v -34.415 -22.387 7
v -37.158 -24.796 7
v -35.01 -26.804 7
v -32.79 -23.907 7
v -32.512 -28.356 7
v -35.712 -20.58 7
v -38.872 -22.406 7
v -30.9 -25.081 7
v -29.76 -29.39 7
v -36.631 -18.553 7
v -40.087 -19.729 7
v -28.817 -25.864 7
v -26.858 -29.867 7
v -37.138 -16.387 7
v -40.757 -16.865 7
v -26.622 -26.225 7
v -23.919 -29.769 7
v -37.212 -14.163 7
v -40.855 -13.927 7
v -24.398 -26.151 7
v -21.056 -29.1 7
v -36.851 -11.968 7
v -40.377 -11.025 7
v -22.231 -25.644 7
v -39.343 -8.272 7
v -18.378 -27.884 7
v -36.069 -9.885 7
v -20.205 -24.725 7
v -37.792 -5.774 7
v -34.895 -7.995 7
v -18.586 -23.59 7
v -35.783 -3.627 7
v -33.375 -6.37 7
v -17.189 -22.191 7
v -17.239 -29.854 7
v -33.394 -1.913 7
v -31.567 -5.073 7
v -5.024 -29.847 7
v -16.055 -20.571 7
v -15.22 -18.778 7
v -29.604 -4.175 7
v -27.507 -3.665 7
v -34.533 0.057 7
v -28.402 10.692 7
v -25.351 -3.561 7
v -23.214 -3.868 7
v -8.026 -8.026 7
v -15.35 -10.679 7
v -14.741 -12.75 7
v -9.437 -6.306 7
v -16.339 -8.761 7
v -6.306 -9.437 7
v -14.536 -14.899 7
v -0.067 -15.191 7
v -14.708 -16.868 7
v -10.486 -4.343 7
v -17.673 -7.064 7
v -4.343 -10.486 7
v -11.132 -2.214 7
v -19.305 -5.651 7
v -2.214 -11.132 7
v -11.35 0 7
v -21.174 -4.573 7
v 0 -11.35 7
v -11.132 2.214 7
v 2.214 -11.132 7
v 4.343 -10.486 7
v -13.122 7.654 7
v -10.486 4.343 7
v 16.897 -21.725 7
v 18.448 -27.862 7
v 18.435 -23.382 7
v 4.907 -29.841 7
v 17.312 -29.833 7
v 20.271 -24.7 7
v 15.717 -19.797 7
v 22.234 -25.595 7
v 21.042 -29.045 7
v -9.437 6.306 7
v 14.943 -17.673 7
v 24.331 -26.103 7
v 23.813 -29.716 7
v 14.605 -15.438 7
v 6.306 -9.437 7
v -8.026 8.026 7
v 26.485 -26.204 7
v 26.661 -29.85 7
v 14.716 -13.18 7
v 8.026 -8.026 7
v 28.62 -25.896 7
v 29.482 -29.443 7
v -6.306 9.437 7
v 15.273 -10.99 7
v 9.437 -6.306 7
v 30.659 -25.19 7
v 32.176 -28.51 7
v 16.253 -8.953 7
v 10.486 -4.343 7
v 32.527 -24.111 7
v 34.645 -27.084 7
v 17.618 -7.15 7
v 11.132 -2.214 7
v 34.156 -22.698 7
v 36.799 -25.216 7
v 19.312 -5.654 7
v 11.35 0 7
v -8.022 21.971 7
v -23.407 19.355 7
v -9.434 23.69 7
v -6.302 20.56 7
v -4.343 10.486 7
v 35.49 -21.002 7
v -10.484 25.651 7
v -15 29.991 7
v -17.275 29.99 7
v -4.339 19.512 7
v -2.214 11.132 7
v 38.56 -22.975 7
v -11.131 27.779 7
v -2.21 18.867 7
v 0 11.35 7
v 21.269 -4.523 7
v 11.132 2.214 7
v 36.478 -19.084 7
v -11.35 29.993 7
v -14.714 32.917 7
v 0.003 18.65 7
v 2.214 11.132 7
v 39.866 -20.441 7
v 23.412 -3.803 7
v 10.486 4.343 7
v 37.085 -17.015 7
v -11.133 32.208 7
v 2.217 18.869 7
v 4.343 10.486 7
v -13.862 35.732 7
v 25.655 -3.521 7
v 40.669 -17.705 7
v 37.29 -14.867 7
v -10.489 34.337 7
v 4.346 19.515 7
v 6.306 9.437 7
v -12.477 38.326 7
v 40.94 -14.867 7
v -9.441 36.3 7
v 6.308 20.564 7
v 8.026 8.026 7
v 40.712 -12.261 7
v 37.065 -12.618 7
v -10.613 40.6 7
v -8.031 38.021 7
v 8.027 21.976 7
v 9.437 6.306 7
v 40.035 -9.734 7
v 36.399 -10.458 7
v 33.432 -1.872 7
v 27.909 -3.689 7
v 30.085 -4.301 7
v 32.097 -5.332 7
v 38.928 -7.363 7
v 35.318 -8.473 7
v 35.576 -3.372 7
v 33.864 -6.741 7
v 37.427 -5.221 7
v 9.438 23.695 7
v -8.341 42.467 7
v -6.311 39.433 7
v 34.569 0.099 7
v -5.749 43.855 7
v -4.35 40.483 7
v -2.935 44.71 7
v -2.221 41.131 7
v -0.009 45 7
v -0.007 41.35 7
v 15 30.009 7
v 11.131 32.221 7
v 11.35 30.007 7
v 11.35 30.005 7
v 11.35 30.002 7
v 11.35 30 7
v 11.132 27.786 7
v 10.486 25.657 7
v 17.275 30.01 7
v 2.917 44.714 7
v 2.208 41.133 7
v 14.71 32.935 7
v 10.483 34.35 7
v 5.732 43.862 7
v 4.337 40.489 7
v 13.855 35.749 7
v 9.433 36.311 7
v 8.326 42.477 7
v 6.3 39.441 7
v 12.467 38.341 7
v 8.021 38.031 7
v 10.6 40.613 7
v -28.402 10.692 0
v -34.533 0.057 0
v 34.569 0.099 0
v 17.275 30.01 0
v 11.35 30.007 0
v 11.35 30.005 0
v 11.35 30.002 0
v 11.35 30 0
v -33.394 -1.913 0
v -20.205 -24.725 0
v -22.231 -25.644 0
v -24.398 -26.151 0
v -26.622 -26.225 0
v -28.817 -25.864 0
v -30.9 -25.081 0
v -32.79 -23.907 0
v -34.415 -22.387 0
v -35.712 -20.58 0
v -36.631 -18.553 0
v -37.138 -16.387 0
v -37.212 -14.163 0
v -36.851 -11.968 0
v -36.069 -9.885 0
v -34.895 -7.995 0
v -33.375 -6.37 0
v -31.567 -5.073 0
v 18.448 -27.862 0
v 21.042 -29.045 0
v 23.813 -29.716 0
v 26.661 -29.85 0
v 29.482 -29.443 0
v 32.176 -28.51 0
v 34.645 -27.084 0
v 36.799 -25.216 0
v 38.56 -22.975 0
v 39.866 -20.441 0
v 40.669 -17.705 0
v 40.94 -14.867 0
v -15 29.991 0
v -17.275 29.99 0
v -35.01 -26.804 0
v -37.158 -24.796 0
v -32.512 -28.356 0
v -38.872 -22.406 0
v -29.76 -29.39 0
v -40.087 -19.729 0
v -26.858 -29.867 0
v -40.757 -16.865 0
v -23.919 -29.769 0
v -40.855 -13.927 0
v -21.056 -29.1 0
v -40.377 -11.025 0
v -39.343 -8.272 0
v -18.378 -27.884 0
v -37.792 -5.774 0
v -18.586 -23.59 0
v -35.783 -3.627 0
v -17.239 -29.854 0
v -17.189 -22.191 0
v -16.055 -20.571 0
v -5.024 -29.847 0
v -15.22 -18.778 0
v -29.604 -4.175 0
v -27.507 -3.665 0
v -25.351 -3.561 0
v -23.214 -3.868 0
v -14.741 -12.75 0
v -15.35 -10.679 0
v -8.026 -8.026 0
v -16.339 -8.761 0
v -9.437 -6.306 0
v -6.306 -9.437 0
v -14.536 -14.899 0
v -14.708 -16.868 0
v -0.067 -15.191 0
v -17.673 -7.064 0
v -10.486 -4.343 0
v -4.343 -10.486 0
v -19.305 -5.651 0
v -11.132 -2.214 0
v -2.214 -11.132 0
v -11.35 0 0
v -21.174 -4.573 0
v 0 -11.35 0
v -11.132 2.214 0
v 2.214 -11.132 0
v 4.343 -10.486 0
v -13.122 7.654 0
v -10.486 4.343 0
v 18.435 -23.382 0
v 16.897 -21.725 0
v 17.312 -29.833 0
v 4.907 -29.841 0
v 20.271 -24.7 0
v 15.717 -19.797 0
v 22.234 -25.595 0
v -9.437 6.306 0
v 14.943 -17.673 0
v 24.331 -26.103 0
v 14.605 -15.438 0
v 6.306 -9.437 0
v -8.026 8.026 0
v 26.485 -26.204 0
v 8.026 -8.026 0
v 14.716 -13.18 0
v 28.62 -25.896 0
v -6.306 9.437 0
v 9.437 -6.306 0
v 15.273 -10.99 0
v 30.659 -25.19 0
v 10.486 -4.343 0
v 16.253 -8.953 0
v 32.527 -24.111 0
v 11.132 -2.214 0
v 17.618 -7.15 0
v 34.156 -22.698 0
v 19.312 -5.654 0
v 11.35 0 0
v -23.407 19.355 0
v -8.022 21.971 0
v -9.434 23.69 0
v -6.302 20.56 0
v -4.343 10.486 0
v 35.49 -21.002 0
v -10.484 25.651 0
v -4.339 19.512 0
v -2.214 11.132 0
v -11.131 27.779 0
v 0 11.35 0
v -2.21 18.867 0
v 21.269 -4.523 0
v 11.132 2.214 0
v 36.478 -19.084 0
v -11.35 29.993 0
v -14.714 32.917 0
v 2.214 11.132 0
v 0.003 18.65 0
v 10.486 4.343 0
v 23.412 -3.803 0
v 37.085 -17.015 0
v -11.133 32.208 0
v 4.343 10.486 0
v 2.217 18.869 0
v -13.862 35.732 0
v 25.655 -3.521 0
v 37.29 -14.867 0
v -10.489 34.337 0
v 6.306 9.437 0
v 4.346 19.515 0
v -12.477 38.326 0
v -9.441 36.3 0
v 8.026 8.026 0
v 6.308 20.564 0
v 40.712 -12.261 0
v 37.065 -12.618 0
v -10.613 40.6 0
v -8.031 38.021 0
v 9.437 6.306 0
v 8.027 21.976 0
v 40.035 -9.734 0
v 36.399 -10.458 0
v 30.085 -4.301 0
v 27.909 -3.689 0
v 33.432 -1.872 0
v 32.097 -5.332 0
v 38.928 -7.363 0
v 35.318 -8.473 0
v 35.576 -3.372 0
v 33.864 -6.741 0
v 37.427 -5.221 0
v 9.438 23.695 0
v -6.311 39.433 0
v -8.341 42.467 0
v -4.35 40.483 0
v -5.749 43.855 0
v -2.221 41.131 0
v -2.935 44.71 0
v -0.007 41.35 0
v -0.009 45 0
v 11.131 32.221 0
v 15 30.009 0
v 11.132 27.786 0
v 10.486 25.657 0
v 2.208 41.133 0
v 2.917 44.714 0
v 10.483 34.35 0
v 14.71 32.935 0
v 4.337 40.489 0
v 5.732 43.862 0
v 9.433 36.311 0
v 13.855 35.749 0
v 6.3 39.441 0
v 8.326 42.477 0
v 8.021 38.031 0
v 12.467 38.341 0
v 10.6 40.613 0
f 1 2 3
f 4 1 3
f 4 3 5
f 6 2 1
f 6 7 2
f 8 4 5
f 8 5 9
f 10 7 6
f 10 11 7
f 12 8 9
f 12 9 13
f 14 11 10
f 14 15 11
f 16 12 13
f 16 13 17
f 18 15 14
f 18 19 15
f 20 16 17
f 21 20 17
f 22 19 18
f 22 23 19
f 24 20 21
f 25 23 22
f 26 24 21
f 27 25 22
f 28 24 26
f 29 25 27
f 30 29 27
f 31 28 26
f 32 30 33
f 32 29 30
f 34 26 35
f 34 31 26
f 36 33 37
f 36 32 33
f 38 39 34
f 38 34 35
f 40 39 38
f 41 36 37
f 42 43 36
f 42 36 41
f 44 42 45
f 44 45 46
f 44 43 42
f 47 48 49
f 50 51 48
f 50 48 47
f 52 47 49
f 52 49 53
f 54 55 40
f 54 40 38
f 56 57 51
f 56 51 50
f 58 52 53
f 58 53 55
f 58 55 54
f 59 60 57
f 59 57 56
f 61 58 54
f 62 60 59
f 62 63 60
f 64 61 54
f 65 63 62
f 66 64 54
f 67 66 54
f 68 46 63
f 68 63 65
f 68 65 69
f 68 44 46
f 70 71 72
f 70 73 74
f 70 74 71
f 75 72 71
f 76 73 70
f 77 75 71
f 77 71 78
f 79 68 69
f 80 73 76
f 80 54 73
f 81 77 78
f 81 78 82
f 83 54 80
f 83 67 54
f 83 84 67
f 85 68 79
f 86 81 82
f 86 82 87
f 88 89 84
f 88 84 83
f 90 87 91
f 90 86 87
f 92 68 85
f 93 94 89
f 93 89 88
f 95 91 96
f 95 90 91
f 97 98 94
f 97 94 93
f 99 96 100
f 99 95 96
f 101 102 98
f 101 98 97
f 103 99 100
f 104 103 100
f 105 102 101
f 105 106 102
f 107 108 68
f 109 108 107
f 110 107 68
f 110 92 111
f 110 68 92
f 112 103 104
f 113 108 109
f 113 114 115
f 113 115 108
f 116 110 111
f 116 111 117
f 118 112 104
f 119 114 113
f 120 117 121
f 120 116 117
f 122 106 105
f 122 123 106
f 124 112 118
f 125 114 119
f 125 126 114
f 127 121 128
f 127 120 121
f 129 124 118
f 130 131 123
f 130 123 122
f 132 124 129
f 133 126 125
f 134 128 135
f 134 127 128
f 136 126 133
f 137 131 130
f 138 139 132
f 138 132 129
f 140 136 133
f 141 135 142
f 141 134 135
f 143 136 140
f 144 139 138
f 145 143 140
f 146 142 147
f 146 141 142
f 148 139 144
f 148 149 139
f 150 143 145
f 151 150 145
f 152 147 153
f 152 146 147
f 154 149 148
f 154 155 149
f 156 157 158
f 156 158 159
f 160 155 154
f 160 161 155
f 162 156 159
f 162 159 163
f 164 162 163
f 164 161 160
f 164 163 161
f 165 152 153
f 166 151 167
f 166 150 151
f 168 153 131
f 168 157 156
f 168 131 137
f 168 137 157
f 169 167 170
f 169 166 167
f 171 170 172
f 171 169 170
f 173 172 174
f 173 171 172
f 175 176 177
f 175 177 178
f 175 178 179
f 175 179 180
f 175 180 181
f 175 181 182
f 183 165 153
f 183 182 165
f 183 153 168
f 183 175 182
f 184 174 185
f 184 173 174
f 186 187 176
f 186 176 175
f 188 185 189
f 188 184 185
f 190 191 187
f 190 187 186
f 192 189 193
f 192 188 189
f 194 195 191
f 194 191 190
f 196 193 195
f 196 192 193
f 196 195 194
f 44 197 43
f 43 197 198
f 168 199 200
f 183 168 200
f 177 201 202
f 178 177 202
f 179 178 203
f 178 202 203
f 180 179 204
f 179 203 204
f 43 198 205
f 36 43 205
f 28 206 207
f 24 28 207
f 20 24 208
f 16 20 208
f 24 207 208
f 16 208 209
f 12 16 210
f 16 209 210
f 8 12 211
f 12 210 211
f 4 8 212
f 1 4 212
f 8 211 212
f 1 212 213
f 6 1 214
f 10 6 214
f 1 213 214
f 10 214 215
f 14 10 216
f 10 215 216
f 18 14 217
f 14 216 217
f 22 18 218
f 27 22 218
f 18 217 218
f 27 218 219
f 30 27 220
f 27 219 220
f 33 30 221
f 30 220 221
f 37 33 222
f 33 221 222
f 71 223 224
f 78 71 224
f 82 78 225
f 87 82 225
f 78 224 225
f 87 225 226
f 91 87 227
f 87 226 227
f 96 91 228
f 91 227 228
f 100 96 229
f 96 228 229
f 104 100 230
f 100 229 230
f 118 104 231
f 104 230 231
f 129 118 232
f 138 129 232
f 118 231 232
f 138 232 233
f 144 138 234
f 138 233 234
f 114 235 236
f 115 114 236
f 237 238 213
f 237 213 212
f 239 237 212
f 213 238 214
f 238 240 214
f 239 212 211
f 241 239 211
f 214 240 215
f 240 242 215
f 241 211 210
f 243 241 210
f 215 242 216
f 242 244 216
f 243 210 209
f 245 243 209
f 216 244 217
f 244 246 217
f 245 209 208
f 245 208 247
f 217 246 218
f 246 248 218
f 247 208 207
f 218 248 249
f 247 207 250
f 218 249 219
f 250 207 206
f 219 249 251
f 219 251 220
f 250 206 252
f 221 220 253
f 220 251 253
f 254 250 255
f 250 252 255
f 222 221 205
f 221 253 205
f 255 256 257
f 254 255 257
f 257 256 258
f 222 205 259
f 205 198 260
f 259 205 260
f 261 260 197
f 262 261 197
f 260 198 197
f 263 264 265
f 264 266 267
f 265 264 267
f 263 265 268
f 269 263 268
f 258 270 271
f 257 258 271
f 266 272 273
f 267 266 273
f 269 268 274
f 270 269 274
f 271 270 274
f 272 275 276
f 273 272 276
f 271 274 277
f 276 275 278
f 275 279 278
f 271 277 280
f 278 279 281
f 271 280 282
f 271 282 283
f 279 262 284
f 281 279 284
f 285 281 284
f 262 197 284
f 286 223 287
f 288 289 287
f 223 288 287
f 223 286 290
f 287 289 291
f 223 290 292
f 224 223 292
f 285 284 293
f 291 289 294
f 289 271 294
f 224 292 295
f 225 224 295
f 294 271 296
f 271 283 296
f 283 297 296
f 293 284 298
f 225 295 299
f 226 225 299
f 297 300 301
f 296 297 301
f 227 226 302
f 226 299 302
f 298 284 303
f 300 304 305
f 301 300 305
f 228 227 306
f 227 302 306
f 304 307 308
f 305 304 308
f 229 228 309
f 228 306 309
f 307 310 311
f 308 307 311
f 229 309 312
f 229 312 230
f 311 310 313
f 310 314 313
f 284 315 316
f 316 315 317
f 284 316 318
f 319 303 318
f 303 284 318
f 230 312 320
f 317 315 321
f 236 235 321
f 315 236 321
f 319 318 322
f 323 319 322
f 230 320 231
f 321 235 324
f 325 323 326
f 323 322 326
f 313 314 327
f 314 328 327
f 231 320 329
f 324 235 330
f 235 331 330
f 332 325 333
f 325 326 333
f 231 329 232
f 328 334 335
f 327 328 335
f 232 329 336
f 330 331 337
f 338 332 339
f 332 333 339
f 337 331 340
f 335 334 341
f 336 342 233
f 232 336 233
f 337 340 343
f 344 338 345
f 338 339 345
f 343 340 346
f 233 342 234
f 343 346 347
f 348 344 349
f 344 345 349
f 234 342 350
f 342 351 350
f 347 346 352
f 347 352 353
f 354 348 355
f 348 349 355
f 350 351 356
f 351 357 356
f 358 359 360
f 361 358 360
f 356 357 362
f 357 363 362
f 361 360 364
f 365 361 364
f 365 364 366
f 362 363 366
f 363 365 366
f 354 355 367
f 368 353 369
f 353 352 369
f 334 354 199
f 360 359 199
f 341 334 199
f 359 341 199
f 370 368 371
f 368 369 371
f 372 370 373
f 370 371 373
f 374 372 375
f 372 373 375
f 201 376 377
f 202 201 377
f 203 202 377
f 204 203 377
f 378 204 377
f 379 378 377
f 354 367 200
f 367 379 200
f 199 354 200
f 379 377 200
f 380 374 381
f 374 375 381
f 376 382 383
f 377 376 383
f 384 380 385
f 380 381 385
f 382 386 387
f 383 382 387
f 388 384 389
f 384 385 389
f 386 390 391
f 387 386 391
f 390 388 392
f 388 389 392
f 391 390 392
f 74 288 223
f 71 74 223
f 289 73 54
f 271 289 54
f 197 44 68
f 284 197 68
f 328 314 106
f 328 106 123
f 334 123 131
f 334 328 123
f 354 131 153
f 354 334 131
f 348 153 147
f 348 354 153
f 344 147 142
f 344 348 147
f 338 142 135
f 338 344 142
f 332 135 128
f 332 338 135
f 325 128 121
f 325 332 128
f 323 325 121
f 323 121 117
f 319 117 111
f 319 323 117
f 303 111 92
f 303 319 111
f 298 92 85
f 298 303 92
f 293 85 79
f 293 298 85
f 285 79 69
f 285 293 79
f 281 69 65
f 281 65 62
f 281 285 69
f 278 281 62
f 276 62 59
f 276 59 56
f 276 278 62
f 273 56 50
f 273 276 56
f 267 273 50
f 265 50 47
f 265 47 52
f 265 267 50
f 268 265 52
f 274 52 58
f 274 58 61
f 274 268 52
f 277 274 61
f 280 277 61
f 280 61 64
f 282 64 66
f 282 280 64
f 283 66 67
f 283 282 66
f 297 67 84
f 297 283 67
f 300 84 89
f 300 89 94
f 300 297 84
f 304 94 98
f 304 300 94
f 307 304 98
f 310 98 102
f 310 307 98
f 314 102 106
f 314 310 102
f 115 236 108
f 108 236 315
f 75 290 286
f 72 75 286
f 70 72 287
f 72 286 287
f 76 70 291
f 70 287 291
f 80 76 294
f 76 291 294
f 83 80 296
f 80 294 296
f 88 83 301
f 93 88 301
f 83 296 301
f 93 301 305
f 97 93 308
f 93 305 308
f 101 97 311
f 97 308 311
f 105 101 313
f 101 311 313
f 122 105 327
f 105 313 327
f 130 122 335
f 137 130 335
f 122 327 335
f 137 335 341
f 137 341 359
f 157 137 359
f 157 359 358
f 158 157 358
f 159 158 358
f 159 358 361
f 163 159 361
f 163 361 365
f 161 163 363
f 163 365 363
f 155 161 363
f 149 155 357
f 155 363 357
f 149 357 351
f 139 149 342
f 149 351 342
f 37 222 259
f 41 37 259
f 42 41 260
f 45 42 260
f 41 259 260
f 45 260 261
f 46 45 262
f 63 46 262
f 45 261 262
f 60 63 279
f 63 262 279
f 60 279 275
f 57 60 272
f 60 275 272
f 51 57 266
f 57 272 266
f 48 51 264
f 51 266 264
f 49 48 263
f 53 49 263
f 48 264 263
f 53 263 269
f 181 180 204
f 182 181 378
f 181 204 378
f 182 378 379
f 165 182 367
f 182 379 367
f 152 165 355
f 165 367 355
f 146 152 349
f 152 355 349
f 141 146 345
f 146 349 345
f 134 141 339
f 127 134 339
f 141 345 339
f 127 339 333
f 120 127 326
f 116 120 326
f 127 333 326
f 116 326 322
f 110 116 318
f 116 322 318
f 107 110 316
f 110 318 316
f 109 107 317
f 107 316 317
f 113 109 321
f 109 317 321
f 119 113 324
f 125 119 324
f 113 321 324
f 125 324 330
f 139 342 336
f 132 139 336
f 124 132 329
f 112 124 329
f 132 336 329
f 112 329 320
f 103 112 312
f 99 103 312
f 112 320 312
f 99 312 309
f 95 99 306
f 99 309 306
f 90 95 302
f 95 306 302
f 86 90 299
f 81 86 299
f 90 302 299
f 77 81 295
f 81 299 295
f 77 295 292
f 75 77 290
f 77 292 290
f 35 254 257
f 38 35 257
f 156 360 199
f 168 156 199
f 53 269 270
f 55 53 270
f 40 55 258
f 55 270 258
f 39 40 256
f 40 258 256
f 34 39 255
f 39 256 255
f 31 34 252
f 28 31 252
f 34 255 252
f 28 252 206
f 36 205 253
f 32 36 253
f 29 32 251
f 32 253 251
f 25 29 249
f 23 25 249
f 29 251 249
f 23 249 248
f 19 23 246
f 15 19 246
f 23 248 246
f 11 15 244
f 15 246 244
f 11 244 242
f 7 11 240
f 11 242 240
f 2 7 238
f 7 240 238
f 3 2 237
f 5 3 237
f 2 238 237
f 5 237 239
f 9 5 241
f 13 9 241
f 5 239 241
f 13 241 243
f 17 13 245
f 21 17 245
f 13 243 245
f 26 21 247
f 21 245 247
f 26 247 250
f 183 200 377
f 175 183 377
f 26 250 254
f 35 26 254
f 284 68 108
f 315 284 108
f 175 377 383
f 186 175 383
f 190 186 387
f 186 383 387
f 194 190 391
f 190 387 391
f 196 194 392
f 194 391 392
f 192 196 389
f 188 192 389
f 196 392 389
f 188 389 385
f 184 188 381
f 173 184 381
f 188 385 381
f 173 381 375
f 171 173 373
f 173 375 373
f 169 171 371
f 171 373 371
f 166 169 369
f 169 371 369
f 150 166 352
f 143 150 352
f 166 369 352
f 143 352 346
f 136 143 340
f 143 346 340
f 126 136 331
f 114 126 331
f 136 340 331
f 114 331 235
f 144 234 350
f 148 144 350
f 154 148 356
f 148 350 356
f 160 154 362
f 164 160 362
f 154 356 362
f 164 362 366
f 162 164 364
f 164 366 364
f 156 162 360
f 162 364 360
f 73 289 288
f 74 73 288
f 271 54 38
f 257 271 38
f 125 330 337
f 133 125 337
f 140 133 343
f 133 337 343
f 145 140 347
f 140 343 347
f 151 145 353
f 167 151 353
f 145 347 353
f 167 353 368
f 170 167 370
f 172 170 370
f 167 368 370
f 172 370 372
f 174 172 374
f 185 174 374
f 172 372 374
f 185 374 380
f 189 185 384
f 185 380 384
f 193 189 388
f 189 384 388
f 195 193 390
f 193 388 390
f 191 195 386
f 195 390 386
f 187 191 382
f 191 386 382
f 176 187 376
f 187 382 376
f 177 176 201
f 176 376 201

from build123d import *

# Parameters (mm, degrees)
F0_R     = 11.35
F1_DEPTH = 7
F3_DEPTH = 50.7


# Not quite as in the source:
# - a feature names something its author has since deleted; it is built from what else it names


with BuildPart() as f1:
    # F0 (on Top) → F1 (new body)
    with BuildSketch(Plane.XY):
        with BuildLine():
            Line((-31.5669890957, -5.0726587053), (-33.3938997814, -1.9127698865))
            ThreePointArc((-33.3938997814, -1.9127698865), (-38.8718921093, -22.4064664798), (-18.378195516, -27.8844588077))
            Line((-18.378195516, -27.8844588077), (-20.2051062016, -24.7245699889))
            ThreePointArc((-20.2051062016, -24.7245699889), (-35.7120032905, -20.5795557942), (-31.5669890957, -5.0726587053))
        make_face()
        with BuildLine():
            ThreePointArc((-10.8860476487, -14.8986143471), (-18.3899747432, -1.9059667726), (-33.3938997814, -1.9127698865))
            Line((-33.3938997814, -1.9127698865), (-31.5669890957, -5.0726587053))
            ThreePointArc((-31.5669890957, -5.0726587053), (-20.2140191502, -5.0675110157), (-14.5360476487, -14.8986143471))
            ThreePointArc((-14.5360476487, -14.8986143471), (-16.0549443173, -20.5706428456), (-20.2051062016, -24.7245699889))
            Line((-20.2051062016, -24.7245699889), (-18.378195516, -27.8844588077))
            ThreePointArc((-18.378195516, -27.8844588077), (-12.8934000742, -22.3946872526), (-10.8860476487, -14.8986143471))
        make_face()
        with BuildLine():
            ThreePointArc((-11.3499979258, 29.9931382104), (-0.0068617896, 41.3499979258), (11.3499979258, 30.0068617896))
            Line((11.3499979258, 30.0068617896), (14.9999972588, 30.0090684445))
            ThreePointArc((14.9999972588, 30.0090684445), (-0.0090684445, 44.9999972588), (-14.9999972588, 29.9909315555))
            Line((-14.9999972588, 29.9909315555), (-11.3499979258, 29.9931382104))
        make_face()
        with BuildLine():
            ThreePointArc((11.3499979258, 30.0068617896), (11.3499994815, 30.003430895), (11.35, 30))
            ThreePointArc((11.35, 30), (0.003430895, 18.6500005185), (-11.3499979258, 29.9931382104))
            Line((-11.3499979258, 29.9931382104), (-14.9999972588, 29.9909315555))
            ThreePointArc((-14.9999972588, 29.9909315555), (0.0045342224, 15.0000006853), (15, 30))
            ThreePointArc((15, 30), (14.9999993147, 30.0045342224), (14.9999972588, 30.0090684445))
            Line((14.9999972588, 30.0090684445), (11.3499979258, 30.0068617896))
        make_face()
        with BuildLine():
            Line((31.6093732737, -5.0344646094), (33.4324619211, -1.8723691359))
            ThreePointArc((33.4324619211, -1.8723691359), (12.9454038899, -7.3751369148), (18.4481716689, -27.8621949459))
            Line((18.4481716689, -27.8621949459), (20.2712603162, -24.7000994724))
            ThreePointArc((20.2712603162, -24.7000994724), (16.1074993635, -9.1982255621), (31.6093732737, -5.0344646094))
        make_face()
        with BuildLine():
            ThreePointArc((40.940316795, -14.8672820409), (38.928430147, -7.3633556317), (33.4324619211, -1.8723691359))
            Line((33.4324619211, -1.8723691359), (31.6093732737, -5.0344646094))
            ThreePointArc((31.6093732737, -5.0344646094), (35.7679892314, -9.189311058), (37.290316795, -14.8672820409))
            ThreePointArc((37.290316795, -14.8672820409), (31.6182877779, -24.6949544773), (20.2712603162, -24.7000994724))
            Line((20.2712603162, -24.7000994724), (18.4481716689, -27.8621949459))
            ThreePointArc((18.4481716689, -27.8621949459), (33.4442432041, -27.855395393), (40.940316795, -14.8672820409))
        make_face()
        with BuildLine():
            Line((17.2754548146, 30.0104441021), (14.9999972588, 30.0090684445))
            ThreePointArc((14.9999972588, 30.0090684445), (14.9999993147, 30.0045342224), (15, 30))
            ThreePointArc((15, 30), (0.0045342224, 15.0000006853), (-14.9999972588, 29.9909315555))
            Line((-14.9999972588, 29.9909315555), (-17.2754548146, 29.9895558979))
            Line((-17.2754548146, 29.9895558979), (-34.5328199137, 0.0571463332))
            Line((-34.5328199137, 0.0571463332), (-33.3938997814, -1.9127698865))
            ThreePointArc((-33.3938997814, -1.9127698865), (-18.3899747432, -1.9059667726), (-10.8860476487, -14.8986143471))
            ThreePointArc((-10.8860476487, -14.8986143471), (-12.8934000742, -22.3946872526), (-18.378195516, -27.8844588077))
            Line((-18.378195516, -27.8844588077), (-17.2392753837, -29.8543750274))
            Line((-17.2392753837, -29.8543750274), (17.3116342454, -29.8334868233))
            Line((17.3116342454, -29.8334868233), (18.4481716689, -27.8621949459))
            ThreePointArc((18.4481716689, -27.8621949459), (12.9454038899, -7.3751369148), (33.4324619211, -1.8723691359))
            Line((33.4324619211, -1.8723691359), (34.5689993445, 0.0989227415))
            Line((34.5689993445, 0.0989227415), (17.2754548146, 30.0104441021))
        make_face()
        Circle(F0_R, mode=Mode.SUBTRACT)
    extrude(amount=F1_DEPTH)

    # F2 (on face) → F3 (cut)
    with BuildSketch(Plane.XY.offset(7)):
        Polygon((-13.1224627256, 7.654147332), (-23.4067556554, 19.3549887506), (-28.4015190728, 10.6917134805), align=None)
        Polygon((-0.067454671, -15.1914597466), (-5.0242557701, -29.8469902776), (4.9070631834, -29.8409861689), align=None)
    extrude(amount=-F3_DEPTH, mode=Mode.SUBTRACT)


solid = f1.part
